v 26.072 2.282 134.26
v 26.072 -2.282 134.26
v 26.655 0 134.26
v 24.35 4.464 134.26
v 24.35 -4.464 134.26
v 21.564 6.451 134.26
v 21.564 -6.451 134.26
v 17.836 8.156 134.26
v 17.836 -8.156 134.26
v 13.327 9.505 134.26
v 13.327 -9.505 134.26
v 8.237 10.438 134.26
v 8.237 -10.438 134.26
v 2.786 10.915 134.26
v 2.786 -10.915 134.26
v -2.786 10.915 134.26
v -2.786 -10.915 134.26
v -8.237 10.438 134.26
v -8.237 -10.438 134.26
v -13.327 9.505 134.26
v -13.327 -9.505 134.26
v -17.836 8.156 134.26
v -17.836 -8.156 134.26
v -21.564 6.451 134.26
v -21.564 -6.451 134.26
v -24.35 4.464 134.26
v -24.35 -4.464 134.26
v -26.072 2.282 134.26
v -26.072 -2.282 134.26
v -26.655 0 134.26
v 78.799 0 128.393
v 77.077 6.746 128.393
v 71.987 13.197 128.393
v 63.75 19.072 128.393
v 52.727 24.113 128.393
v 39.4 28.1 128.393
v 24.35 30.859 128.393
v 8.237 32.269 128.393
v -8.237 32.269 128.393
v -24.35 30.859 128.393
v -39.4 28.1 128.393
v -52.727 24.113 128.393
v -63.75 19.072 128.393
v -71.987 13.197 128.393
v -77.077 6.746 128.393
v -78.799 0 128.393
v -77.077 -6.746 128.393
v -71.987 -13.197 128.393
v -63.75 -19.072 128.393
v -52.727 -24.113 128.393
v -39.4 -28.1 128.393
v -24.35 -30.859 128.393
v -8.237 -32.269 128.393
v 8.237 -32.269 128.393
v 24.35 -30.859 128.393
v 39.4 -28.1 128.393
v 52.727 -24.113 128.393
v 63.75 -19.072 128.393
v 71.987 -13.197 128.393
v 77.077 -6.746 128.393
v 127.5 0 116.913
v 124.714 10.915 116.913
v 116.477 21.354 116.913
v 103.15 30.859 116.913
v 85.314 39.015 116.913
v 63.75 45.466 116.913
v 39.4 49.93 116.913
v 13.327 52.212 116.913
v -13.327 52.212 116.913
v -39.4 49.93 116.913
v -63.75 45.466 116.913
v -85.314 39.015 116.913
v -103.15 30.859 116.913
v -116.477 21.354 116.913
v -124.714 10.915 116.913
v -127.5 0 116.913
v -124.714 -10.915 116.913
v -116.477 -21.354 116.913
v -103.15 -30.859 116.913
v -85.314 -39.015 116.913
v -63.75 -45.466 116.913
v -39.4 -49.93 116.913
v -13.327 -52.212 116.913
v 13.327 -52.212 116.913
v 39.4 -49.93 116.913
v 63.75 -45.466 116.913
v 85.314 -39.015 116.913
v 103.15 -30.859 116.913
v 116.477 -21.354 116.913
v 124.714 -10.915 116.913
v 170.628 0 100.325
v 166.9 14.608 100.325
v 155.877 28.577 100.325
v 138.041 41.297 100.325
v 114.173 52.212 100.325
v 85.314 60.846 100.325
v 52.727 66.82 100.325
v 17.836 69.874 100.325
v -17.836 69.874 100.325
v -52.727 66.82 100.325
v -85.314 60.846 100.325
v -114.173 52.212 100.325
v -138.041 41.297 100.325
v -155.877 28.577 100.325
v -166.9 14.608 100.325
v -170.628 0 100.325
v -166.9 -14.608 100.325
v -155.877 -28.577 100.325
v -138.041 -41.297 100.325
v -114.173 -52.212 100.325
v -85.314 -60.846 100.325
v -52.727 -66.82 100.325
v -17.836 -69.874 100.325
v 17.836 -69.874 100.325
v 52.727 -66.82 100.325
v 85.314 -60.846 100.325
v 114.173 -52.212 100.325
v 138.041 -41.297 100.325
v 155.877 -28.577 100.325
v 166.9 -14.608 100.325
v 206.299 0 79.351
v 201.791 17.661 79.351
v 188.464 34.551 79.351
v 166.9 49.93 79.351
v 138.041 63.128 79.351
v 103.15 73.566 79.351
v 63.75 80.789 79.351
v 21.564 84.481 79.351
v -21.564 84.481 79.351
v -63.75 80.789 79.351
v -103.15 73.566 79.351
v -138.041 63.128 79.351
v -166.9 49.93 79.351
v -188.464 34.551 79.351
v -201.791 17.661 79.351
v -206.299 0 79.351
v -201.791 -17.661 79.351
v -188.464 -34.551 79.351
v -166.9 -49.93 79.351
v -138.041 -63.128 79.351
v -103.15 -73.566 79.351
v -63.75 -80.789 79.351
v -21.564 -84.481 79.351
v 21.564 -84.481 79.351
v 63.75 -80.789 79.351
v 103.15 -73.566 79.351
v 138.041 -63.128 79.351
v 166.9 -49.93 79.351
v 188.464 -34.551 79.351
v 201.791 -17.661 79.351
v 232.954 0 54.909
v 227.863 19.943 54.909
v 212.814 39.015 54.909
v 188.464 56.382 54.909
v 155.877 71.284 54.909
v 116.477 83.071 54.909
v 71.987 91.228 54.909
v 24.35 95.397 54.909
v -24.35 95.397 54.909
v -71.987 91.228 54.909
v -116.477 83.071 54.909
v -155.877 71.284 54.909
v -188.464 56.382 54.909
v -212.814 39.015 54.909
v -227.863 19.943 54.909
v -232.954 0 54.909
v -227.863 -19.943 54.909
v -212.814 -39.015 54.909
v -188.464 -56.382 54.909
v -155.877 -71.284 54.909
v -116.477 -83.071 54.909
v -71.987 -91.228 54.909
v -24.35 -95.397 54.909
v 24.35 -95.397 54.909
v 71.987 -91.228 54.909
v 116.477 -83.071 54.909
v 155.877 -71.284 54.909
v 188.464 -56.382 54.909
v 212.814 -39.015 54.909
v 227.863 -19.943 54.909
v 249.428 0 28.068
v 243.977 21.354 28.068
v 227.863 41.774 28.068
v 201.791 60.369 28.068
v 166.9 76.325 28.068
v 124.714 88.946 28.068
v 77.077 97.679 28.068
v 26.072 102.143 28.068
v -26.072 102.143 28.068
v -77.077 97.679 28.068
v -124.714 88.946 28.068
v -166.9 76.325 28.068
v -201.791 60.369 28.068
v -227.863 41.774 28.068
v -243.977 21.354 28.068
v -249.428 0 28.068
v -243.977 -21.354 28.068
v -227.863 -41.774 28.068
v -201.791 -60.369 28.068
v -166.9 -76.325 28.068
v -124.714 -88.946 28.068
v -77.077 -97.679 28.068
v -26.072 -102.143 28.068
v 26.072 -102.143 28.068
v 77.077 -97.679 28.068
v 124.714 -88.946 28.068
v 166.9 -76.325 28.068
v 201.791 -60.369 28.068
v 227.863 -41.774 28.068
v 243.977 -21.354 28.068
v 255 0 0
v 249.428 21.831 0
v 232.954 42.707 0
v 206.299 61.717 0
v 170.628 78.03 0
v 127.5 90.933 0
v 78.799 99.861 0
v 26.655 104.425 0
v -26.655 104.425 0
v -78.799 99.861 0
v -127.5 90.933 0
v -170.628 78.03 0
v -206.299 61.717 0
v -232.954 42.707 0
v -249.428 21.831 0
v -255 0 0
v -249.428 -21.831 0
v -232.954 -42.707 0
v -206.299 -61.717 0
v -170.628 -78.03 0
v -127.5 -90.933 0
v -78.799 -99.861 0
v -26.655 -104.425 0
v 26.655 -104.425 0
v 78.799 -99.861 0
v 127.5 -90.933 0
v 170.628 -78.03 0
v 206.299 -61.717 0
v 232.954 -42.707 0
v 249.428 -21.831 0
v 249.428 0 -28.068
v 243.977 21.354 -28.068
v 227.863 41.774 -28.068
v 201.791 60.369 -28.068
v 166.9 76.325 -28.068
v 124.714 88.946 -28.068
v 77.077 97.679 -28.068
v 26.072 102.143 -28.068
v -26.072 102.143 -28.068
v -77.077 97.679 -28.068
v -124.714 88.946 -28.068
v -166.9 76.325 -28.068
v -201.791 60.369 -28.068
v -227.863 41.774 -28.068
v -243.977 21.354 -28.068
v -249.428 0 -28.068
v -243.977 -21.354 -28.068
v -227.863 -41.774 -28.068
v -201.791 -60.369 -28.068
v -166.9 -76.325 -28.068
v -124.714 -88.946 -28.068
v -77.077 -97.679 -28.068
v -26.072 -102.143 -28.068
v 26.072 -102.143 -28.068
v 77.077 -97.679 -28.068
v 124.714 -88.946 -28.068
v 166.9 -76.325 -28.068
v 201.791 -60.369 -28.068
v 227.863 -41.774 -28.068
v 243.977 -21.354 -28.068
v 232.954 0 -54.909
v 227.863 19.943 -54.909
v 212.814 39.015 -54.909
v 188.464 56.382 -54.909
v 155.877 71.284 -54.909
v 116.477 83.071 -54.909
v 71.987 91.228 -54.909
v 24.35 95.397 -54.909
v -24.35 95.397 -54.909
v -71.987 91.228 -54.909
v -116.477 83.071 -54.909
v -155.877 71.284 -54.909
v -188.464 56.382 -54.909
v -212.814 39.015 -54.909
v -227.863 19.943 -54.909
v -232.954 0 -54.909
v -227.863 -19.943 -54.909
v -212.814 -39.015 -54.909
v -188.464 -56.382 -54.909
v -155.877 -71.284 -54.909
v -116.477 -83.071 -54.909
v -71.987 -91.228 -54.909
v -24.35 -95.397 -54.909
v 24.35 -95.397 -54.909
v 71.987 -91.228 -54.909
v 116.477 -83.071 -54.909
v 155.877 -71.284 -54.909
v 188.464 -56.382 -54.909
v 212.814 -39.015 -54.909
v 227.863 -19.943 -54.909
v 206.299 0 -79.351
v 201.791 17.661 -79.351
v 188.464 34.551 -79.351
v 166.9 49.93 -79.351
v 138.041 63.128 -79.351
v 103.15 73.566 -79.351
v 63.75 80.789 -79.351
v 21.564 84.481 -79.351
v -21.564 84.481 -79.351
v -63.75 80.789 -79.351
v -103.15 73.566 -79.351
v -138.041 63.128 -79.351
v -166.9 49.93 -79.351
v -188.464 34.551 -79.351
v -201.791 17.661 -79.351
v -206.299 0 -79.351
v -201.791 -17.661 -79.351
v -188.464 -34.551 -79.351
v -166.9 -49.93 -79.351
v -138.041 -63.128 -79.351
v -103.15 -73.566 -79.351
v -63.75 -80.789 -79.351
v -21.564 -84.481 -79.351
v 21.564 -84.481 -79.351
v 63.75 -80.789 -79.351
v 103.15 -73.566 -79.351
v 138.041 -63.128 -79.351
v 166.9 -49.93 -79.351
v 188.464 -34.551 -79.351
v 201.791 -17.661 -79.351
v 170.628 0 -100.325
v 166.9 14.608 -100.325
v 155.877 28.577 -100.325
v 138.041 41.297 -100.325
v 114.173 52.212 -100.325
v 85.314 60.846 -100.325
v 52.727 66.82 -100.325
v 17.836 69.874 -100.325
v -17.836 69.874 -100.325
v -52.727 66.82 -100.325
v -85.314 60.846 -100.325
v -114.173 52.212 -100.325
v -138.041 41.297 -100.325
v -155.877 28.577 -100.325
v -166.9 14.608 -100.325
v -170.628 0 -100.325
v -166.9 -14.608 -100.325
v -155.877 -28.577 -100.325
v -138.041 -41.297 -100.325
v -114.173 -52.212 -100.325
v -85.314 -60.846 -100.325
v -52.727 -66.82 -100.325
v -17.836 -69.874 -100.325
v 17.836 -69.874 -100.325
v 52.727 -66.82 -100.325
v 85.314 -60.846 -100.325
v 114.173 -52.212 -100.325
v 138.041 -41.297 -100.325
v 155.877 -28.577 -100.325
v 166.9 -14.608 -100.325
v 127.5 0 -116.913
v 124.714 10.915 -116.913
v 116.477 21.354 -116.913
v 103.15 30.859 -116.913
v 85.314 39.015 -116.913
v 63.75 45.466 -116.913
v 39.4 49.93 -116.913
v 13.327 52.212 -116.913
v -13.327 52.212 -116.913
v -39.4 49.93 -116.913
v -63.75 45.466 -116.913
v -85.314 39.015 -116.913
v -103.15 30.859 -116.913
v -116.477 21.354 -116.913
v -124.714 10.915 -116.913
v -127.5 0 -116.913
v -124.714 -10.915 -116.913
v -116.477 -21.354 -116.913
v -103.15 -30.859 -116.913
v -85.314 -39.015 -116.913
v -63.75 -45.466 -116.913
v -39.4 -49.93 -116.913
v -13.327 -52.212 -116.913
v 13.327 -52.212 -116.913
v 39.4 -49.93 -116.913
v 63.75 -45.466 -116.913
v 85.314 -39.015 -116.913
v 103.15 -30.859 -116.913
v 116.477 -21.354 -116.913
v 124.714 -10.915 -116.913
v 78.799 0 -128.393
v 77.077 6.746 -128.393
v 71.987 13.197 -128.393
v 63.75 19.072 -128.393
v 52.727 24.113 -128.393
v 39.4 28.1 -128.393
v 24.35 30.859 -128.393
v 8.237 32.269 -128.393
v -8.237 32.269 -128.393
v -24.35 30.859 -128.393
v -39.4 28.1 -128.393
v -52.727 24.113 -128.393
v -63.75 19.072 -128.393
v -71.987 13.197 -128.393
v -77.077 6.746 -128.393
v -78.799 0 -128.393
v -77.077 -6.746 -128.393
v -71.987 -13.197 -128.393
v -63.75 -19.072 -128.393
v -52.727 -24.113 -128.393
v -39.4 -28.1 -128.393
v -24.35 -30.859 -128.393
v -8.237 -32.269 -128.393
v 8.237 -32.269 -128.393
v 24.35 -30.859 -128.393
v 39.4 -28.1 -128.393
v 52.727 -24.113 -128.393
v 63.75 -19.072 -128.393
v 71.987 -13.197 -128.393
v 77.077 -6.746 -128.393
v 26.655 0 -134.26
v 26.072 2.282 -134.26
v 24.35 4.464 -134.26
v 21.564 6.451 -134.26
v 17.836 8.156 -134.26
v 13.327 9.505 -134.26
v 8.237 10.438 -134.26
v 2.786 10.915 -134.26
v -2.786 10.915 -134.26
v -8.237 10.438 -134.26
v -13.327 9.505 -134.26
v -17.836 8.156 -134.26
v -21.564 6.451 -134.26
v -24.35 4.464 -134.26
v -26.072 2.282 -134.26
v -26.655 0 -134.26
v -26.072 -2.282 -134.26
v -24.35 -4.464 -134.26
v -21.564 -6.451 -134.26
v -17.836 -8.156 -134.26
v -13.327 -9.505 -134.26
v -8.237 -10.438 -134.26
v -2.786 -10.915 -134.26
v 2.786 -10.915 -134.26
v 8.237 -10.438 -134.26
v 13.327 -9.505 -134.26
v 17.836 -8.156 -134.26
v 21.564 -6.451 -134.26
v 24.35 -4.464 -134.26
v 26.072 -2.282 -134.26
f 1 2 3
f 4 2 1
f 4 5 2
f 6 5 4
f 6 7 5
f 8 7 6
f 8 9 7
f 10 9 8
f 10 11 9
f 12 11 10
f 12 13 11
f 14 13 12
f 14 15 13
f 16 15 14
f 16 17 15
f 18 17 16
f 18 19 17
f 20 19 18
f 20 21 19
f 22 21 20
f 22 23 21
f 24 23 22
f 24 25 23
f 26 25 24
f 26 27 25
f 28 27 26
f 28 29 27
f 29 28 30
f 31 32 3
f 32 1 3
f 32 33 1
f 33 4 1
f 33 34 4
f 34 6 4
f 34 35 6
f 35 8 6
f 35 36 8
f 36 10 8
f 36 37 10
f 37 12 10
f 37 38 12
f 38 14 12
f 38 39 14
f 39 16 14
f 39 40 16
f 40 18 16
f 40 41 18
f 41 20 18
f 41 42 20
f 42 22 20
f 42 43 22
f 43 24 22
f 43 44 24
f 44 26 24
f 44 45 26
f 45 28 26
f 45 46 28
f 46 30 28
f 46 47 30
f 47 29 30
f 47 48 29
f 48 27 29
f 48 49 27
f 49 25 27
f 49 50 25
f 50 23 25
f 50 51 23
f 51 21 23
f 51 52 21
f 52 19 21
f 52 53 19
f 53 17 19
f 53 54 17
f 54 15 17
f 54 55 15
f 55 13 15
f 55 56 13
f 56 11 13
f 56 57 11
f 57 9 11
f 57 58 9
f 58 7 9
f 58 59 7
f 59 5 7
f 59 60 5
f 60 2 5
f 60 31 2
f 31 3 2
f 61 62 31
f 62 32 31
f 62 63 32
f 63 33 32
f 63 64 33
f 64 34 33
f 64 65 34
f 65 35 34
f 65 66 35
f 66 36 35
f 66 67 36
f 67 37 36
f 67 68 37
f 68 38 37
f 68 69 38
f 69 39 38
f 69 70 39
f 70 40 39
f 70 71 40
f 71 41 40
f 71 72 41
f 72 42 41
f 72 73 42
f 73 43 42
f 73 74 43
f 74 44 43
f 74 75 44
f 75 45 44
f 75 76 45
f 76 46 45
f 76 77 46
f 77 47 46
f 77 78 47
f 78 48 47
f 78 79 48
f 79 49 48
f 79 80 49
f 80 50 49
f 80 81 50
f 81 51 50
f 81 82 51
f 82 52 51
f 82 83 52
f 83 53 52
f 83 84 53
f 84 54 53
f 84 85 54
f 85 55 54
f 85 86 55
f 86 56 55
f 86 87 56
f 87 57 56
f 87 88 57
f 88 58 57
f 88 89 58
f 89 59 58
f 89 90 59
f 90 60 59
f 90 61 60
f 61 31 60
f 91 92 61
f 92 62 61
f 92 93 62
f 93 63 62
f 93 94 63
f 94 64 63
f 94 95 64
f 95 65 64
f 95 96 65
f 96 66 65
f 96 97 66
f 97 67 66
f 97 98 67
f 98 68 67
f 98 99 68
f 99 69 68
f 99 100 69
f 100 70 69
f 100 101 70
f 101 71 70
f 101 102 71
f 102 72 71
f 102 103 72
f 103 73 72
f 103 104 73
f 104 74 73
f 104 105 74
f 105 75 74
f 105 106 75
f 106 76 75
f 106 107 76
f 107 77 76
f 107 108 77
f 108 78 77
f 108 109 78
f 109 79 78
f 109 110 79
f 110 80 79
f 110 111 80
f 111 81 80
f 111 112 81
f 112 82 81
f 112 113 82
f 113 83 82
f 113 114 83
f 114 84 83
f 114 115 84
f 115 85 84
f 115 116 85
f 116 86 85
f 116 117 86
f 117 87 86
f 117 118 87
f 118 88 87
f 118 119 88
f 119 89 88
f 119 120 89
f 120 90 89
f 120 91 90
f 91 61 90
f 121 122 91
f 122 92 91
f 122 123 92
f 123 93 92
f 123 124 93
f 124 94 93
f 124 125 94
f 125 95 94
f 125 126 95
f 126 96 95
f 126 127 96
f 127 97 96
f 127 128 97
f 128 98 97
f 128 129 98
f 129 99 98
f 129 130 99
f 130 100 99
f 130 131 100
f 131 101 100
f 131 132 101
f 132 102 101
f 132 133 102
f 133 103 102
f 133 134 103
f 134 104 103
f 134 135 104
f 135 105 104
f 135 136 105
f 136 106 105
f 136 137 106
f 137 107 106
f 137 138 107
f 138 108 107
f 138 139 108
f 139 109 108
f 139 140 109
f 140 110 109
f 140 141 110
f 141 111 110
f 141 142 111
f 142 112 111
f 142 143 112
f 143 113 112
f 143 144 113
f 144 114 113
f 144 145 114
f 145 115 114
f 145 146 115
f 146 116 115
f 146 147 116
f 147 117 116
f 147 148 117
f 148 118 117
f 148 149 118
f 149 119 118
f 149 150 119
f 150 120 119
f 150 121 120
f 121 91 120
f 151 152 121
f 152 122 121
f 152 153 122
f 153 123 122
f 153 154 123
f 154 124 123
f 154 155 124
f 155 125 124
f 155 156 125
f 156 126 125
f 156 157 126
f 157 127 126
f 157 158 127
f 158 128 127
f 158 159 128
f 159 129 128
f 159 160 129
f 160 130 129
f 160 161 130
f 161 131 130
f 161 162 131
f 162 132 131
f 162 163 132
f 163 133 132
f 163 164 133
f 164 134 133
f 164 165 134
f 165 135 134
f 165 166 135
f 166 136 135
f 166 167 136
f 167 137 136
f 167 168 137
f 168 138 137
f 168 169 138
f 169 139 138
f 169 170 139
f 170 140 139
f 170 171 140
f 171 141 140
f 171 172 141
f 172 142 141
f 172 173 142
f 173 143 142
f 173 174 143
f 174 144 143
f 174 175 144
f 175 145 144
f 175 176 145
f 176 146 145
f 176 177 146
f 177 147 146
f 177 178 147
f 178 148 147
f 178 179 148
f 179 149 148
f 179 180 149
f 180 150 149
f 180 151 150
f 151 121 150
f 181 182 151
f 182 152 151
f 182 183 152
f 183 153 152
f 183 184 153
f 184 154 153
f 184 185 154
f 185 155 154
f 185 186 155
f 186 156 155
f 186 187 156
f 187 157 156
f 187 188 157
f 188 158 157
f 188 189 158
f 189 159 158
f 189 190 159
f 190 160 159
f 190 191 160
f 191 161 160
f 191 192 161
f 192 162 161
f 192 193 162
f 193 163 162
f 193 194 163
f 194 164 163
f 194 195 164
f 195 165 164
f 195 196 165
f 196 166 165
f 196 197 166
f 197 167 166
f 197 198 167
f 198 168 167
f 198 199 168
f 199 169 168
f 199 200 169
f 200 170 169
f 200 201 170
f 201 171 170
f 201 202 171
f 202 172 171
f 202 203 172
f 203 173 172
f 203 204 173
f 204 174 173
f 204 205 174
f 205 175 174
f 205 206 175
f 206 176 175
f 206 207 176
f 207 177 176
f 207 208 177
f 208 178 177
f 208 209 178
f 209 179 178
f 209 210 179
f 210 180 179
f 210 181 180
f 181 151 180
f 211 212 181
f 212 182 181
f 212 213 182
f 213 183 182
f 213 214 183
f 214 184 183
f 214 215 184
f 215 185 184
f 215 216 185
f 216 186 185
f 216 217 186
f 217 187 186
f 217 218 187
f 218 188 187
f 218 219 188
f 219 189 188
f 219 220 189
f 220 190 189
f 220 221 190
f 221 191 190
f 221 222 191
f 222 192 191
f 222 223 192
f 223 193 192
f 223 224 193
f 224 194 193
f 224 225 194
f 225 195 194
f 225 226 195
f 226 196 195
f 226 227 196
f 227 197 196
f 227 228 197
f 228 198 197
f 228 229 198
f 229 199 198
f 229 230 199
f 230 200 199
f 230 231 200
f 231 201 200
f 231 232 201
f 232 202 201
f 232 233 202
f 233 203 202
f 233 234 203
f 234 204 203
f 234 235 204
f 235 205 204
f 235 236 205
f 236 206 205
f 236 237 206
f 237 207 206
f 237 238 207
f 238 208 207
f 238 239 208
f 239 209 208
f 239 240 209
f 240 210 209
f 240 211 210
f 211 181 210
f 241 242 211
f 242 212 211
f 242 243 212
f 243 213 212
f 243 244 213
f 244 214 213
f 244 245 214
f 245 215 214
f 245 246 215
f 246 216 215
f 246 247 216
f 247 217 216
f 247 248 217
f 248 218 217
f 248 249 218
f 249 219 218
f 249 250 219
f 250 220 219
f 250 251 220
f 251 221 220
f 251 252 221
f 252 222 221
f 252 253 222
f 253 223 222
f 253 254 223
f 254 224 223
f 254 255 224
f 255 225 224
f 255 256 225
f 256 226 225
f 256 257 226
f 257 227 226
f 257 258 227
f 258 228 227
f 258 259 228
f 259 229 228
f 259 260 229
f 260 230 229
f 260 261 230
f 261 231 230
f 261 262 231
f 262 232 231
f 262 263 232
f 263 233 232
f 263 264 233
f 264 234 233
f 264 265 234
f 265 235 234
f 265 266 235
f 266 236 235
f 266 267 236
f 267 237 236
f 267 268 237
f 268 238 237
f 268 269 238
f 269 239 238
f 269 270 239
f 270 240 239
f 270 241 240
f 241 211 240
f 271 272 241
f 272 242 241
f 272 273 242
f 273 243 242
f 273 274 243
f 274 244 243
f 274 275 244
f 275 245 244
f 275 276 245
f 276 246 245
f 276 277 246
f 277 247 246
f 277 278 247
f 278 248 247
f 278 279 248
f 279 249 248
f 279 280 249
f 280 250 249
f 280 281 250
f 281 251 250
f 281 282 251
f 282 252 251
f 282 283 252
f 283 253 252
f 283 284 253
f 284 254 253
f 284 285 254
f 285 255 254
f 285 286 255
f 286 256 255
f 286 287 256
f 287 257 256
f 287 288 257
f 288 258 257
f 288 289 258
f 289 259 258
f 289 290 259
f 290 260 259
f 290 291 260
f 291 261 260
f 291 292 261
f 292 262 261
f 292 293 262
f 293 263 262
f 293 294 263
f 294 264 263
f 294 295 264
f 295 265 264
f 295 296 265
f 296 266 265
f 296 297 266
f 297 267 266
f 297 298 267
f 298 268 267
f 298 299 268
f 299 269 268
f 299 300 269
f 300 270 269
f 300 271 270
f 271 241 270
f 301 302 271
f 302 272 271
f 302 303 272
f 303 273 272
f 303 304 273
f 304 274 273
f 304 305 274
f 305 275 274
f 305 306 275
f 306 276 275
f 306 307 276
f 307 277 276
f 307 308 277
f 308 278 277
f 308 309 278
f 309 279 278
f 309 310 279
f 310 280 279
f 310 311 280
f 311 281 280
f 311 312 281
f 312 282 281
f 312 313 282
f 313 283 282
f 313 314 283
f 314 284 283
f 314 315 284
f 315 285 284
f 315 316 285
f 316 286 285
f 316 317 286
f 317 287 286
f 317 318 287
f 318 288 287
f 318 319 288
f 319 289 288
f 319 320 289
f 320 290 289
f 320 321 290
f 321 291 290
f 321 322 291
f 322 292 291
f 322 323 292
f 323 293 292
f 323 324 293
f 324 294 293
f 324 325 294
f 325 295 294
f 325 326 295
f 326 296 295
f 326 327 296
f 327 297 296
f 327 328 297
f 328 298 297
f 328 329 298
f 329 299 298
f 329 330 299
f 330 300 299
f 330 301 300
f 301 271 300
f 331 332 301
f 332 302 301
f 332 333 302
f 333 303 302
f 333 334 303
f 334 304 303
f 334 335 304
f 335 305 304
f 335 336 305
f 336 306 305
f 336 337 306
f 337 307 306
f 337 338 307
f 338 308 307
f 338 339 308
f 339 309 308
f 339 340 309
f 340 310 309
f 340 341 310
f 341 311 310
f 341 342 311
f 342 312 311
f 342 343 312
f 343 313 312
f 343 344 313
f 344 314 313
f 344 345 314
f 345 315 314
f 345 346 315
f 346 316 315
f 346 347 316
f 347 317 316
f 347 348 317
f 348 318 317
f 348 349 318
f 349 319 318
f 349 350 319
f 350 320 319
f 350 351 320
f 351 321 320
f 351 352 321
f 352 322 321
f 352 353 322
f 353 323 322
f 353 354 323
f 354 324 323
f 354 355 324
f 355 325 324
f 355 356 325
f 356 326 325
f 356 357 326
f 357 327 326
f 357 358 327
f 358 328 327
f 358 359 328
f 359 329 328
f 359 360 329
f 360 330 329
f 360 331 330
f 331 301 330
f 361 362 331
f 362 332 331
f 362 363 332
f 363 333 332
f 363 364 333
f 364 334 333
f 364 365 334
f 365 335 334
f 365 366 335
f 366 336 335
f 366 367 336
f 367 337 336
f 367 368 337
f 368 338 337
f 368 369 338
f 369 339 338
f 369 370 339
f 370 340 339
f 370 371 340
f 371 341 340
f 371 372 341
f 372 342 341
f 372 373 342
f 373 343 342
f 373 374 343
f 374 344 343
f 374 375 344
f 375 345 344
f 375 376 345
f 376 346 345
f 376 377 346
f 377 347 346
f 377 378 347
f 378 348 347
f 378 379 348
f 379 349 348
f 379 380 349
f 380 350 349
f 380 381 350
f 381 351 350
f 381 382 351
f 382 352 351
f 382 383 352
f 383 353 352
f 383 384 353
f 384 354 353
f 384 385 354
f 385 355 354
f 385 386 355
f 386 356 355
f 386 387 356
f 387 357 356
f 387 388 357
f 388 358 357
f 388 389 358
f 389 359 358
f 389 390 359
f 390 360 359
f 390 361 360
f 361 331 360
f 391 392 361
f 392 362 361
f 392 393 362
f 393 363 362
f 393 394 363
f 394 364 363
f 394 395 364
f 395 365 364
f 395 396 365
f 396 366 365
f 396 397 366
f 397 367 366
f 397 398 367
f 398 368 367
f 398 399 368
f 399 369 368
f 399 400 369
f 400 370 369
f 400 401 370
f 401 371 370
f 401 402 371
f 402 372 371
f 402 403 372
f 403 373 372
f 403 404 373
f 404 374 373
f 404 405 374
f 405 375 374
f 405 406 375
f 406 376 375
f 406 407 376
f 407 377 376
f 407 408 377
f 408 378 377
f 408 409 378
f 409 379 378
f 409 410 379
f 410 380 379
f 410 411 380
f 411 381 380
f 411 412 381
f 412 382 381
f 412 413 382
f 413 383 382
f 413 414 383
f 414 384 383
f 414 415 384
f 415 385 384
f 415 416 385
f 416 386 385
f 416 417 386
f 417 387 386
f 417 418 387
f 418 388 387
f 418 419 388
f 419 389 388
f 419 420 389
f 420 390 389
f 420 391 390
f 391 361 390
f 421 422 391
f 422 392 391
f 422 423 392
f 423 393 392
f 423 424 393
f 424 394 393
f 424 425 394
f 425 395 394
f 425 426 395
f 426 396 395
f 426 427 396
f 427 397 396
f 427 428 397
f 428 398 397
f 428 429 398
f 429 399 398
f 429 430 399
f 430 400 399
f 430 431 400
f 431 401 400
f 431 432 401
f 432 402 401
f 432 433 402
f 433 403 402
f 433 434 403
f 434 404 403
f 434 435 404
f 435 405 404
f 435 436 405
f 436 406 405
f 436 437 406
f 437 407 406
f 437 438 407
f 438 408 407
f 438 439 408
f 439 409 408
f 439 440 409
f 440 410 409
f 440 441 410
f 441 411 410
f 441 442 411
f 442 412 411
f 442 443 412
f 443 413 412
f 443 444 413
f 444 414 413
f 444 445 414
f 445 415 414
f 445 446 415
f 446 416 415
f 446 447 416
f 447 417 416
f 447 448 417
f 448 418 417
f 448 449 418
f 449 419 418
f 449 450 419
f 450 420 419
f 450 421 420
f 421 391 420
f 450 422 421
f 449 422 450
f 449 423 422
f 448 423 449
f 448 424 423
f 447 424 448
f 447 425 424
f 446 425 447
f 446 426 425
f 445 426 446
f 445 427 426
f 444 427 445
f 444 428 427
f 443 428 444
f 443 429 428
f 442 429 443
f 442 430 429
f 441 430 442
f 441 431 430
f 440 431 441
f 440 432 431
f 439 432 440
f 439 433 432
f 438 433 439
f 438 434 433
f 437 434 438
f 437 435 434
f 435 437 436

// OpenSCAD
// Generated by SolidPython 1.0.1 on 2020-07-29 00:46:52


scale(v = [17, 7, 9]) {
	sphere(r = 15);
}
/***********************************************
*********      SolidPython code:      **********
************************************************
 
# import packages: SolidPython
from solid import *
from solid.utils import *
from itertools import chain, combinations, permutations


class Resize:

    def __init__(self, scad_file):
        self.scad_file = scad_file
        #self.scad_file = import_scad(scad_file)
        # cone/cylinder param:
        self.r1 = 0
        self.r2 = 0
        self.h = 0
        # rectangular prism param:
        self.w = 0
        self.l = 0
        # ellipse param:
        self.r = 0

    # import OpenScad code (file name corresponds to shape)


    # classify shape + parameters
    def assign(self, param1, param2, param3):
        if self.scad_file == 'cone.scad':
            self.r1 = param1
            self.r2 = param2
            self.h = param3
        elif self.scad_file == 'cylinder.scad':
            self.r1 = param1
            self.r2 = param2
            self.h = param3
        elif self.scad_file == 'rectangularPrism.scad':
            self.h = param1
            self.l = param2
            self.w = param3
        else:
            self.r = param1
            self.h = param2

    # resize parameters
    def iterate(self):
        x = range(3, 20, 2)
        i = 1
        if self.scad_file == 'cone.scad':
            tempList = list(permutations(x, 2))
            for temp in tempList:
                param1 = temp[0]
                param2 = temp[1]
                filepath = 'produced_scad_files/' + 'cone' + str(param1) + '_' + str(param2) + '_' + '.scad'
                scad_render_to_file(cylinder(h=param1, r1=param2, r2=0), filepath)

        elif self.scad_file == 'cylinder.scad':
            tempList = list(permutations(x, 3))
            for temp in tempList:
                param1 = temp[0]
                param2 = temp[1]
                filepath = 'produced_scad_files/' + 'cylinder' + str(param1) + '_' + str(param2) + '_' + '.scad'
                scad_render_to_file(cylinder(h=param1, r1=param2, r2=param2), filepath)

        elif self.scad_file == 'rectangularPrism.scad':
            tempList = list(permutations(x, 3))
            for temp in tempList:
                param1 = temp[0]
                param2 = temp[1]
                param3 = temp[2]
                filepath = 'produced_scad_files/' + 'rectangularPrism' + str(param1) + '_' + str(param2) + '_' + str(
                    param3) + '.scad'
                scad_render_to_file(cube(size=(param1, param2, param3)), filepath)

        elif self.scad_file == 'ellipse.scad':
            tempList = list(permutations(x, 4))
            for temp in tempList:
                param1 = temp[0]
                param2 = temp[1]
                param3 = temp[2]
                param4 = temp[3]
                filepath = 'produced_scad_files/' + 'ellipse' + str(param1) + '_' + str(param2) + '_' + str(param3) + '_' + str(param4) + '.scad'
                scad_render_to_file(scale([param1, param2, param3])(sphere(r=param4)), filepath)

    def render_to_scadfile(self):
        scad_render_to_file(scad, 'example.scad') 
 
************************************************/
